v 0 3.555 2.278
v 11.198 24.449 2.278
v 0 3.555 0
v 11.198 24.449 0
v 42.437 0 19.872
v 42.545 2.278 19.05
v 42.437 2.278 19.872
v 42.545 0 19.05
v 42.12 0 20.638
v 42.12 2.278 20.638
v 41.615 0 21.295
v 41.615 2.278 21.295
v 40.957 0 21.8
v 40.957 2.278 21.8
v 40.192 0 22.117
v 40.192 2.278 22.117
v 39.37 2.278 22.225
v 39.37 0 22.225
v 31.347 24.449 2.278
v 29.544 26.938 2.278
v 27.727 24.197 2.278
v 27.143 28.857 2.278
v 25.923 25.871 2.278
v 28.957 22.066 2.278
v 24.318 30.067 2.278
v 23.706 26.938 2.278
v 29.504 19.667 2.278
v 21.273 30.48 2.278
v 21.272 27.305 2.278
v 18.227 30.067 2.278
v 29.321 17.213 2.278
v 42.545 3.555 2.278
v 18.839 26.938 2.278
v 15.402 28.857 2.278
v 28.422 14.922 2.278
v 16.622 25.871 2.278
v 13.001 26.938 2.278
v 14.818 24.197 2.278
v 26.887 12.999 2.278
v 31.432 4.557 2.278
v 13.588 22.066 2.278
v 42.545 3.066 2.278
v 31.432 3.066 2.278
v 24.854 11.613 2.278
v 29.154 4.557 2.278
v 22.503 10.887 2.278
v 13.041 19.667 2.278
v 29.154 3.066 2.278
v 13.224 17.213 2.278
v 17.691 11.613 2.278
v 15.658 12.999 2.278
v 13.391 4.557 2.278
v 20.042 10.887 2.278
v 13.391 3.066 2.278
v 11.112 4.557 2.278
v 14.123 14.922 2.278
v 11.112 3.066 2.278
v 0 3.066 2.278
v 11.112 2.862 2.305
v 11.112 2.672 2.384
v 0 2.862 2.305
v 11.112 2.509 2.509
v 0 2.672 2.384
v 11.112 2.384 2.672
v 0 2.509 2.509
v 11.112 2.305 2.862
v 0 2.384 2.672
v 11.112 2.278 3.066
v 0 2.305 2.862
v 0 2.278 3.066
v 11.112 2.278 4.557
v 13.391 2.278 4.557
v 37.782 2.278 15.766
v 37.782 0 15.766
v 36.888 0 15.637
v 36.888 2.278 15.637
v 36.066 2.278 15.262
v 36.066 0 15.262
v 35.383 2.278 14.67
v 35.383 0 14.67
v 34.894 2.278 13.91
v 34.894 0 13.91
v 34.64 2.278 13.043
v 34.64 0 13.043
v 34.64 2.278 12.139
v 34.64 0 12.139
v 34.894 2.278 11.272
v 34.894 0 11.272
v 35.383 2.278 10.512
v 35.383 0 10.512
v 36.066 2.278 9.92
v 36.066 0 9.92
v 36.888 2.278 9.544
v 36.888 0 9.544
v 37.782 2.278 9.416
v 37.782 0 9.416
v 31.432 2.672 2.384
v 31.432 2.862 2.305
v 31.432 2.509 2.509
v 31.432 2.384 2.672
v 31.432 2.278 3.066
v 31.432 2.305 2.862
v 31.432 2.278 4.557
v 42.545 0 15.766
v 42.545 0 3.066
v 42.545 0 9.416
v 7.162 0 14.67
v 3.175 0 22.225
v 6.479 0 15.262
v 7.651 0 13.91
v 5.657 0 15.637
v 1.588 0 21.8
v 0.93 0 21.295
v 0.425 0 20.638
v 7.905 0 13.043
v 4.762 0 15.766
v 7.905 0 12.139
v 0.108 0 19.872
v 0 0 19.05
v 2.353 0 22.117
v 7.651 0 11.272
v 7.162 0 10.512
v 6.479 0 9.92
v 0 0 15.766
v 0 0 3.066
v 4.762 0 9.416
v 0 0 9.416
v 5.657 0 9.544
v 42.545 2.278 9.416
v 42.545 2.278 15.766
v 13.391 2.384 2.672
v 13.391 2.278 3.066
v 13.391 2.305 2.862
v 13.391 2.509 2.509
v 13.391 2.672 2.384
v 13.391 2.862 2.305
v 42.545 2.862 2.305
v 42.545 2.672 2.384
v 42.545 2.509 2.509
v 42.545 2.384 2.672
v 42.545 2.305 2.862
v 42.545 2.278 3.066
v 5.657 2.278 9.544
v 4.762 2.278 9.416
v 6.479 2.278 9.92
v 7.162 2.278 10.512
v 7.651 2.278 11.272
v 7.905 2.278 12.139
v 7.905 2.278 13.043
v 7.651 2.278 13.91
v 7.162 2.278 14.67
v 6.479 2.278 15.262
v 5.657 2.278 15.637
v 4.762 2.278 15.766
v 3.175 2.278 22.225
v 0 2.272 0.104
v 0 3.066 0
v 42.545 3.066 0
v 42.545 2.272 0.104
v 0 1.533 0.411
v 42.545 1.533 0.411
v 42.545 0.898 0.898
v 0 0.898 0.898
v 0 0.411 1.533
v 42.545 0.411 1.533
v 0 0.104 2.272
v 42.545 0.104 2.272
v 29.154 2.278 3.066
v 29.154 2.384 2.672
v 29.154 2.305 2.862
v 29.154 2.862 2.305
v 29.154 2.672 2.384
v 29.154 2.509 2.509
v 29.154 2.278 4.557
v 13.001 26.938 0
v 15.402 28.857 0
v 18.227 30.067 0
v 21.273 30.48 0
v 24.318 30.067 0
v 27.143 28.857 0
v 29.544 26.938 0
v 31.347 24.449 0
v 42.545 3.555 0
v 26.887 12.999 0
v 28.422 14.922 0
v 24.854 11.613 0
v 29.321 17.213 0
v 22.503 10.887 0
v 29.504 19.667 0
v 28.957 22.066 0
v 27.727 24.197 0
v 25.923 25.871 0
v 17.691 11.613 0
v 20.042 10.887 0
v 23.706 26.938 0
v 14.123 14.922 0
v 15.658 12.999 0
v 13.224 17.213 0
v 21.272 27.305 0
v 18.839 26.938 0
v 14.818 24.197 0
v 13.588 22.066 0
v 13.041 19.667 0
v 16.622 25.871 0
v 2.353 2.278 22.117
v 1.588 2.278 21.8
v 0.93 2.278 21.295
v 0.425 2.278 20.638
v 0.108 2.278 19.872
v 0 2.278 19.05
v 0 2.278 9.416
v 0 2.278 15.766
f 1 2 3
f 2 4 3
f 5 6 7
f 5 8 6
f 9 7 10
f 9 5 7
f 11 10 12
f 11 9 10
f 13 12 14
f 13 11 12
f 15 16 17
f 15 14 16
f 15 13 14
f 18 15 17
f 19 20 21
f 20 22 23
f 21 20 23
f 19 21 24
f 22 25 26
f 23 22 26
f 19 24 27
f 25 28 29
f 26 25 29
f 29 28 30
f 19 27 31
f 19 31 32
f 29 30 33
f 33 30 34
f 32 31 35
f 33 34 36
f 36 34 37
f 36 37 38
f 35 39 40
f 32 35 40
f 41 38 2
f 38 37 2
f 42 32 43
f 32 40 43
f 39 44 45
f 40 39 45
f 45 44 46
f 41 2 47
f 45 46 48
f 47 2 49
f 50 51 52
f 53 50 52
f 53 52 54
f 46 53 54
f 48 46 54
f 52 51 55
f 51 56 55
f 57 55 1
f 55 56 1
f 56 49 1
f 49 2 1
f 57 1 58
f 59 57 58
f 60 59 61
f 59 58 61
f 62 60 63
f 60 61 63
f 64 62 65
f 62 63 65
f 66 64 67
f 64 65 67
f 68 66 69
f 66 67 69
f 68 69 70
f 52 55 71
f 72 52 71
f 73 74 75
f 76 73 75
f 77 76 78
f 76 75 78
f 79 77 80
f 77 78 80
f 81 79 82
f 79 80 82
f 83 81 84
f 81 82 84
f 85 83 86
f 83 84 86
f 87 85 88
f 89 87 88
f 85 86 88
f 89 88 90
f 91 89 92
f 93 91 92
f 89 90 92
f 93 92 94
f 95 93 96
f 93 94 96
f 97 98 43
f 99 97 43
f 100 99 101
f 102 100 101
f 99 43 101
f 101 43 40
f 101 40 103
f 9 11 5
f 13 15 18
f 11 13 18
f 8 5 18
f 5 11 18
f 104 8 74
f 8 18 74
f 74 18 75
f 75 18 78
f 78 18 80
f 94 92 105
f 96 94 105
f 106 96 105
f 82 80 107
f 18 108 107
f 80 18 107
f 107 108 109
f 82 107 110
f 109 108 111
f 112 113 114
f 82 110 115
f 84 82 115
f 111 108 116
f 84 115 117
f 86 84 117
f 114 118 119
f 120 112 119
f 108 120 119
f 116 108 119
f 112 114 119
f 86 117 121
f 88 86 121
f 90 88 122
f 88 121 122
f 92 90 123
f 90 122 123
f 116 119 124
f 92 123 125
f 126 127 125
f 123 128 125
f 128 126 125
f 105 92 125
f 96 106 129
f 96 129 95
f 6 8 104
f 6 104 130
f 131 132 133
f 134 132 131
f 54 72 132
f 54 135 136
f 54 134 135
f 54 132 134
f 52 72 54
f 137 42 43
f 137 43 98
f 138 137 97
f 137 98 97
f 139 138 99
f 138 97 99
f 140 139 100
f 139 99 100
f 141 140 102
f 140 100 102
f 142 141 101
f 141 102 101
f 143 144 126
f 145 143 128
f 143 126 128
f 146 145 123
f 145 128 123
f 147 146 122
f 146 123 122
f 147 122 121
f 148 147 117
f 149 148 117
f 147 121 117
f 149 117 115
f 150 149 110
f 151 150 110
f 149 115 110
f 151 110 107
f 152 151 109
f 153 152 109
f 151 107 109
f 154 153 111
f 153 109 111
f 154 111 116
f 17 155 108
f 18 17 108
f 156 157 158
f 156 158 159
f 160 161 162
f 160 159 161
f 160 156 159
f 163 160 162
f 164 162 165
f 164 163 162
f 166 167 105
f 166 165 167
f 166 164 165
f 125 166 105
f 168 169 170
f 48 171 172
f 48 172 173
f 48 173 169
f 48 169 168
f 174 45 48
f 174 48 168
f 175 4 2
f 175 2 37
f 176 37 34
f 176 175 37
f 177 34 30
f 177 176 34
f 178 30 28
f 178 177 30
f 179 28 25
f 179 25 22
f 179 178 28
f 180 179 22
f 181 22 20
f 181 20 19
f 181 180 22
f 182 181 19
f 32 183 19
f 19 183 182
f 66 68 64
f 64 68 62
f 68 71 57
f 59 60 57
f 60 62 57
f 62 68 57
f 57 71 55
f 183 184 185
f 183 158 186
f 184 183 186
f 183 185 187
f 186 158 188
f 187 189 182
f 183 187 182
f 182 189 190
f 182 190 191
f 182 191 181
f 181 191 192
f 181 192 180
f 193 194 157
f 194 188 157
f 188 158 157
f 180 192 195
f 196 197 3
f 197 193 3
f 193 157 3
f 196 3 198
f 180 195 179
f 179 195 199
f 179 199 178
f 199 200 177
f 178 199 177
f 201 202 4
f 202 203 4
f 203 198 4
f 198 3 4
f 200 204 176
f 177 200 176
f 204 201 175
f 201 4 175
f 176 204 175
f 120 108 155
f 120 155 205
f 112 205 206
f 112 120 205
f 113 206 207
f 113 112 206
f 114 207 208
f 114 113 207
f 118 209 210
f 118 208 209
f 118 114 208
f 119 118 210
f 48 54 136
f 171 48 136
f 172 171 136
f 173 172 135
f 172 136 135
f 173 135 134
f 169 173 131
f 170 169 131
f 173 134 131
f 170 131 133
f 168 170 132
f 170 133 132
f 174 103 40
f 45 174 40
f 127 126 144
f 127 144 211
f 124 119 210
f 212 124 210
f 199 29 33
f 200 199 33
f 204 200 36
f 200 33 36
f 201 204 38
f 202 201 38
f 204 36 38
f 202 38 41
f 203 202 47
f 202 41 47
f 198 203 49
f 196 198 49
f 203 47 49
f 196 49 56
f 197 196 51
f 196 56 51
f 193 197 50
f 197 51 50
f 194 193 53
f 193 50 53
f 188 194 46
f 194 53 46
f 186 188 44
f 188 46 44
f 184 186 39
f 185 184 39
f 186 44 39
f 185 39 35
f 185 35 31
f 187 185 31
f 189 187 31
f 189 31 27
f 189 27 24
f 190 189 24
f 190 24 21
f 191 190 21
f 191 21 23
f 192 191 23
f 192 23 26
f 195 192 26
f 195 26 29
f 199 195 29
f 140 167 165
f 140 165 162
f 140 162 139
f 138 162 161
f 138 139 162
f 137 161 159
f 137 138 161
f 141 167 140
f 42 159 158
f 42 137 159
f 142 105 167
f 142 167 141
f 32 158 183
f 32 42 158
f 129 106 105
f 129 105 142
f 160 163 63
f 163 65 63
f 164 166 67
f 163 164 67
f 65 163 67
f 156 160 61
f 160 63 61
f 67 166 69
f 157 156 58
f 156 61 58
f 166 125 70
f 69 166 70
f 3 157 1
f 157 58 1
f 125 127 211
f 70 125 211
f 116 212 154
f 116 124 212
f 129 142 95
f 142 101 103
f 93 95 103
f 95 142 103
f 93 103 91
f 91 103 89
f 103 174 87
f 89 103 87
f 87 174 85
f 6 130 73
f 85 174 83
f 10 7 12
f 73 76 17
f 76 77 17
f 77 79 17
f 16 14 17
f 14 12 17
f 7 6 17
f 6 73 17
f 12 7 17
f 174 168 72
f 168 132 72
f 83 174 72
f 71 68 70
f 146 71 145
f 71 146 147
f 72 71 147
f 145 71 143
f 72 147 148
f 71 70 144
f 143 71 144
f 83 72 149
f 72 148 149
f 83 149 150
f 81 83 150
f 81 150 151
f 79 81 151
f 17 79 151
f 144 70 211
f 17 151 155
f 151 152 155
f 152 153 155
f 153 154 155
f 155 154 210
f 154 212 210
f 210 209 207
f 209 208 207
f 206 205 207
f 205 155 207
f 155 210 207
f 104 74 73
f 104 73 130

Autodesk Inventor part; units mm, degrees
sketch "Sketch_1" plane through (0, 0, 0) normal (1, 0, 0) x (0, 1, 0)
  line L0 (0, 22.225) -> (0, 3.0658)
  arc A0 (0, 3.0658) -> (3.0658, 0) centre (3.0658, 3.0658) ccw
  line L1 (3.0658, 0) -> (31.6408, 0)
  line L2 (31.6408, 0) -> (31.6408, 2.2784)
  line L3 (31.6408, 2.2784) -> (3.0658, 2.2784)
  arc A1 (2.2784, 3.0658) -> (3.0658, 2.2784) centre (3.0658, 3.0658) ccw
  line L4 (2.2784, 3.0658) -> (2.2784, 22.225)
  line L5 (2.2784, 22.225) -> (0, 22.225)
  dimension "d36" = 28.575
  dimension "d37" = 3.0658
  dimension "d38" = 0.7874
  dimension "d40" = 2.2784
  dimension "d43" = 22.225
extrude "Extrusion1" add sketch "Sketch_1" along normal blind 42.545
sketch "Sketch_2" plane through (0, 0, 0) normal (0, 0, 1) x (1, 0, 0)
  line L0 (-3.175, -2.1057) -> (45.72, -2.1057)
  line L1 (45.72, -2.1057) -> (45.72, 33.6906)
  line L2 (45.72, 33.6906) -> (-3.175, 33.6906)
  line L3 (-3.175, 33.6906) -> (-3.175, -2.1057)
  line L4 (-1.905, 0) -> (44.45, 0)
  line L5 (44.45, 0) -> (31.3469, 24.4492)
  arc A0 (31.3469, 24.4492) -> (11.1981, 24.4492) centre (21.2725, 19.05) ccw
  line L6 (11.1981, 24.4492) -> (-1.905, 0)
  line L7 (0, 0) -> (0, 3.0658) construction
  line L8 (0, 3.0658) -> (42.545, 3.0658) construction
  line L9 (42.545, 0) -> (42.545, 3.0658) construction
  line L10 (0, 0) -> (42.545, 0) construction
  line L11 (21.2725, 19.05) -> (21.2725, 0) construction
  line L12 (21.2725, 0) -> (21.2725, -2.1057) construction
  dimension "d23" = 46.355
  dimension "d24" = 11.43
  dimension "d25" = 19.05
  dimension "d26" = 35.7962
  dimension "d27" = 48.895
  dimension "d30" = 2.1057
extrude "Extrusion2" cut sketch "Sketch_2" along normal blind 3.4176
sketch "Sketch3" plane through (42.545, 3.0658, 0) normal (0, 0, -1) x (-1, 0, 0)
  arc A0 (31.3469, 21.3834) -> (11.1981, 21.3834) centre (21.2725, 15.9842) ccw projected
hole "Drilling 1" at (21.2725, 19.05, 0) direction (0, 0, 1) diameter 16.51 depth 3.4176
sketch "Sketch_8" plane through (0, 0, 0) normal (0, 1, 0) x (-1, 0, 0)
  line L0 (3.4925, 15.7658) -> (-4.7625, 15.7658)
  arc A0 (-4.7625, 15.7658) -> (-4.7625, 9.4158) centre (-4.7625, 12.5908) ccw
  line L1 (-4.7625, 9.4158) -> (3.4925, 9.4158)
  line L2 (3.4925, 9.4158) -> (3.4925, 15.7658)
  line L3 (0, 3.0658) -> (-42.545, 3.0658) projected
  dimension "d31" = 3.4925
  dimension "d32" = 8.255
  dimension "d33" = 3.175
  dimension "d34" = 6.35
  dimension "d35" = 6.35
extrude "Extrusion5" cut sketch "Sketch_8" along normal blind 3.4176
sketch "Sketch_10" plane through (11.1125, 0, 0) normal (1, 0, 0) x (0, 0, -1)
  arc A0 (-4.5568, 1.8456) -> (-1.8456, 4.5568) centre (-3.0658, 3.0658) ccw
  line L0 (-1.8456, 4.5568) -> (-2.2784, 4.5568)
  line L1 (-2.2784, 4.5568) -> (-4.5568, 2.2784)
  line L2 (-4.5568, 2.2784) -> (-4.5568, 1.8456)
extrude "Extrusion7" add sketch "Sketch_10" along normal blind 2.2784
ref_plane "h1_XY" through (17.4625, 0, 17.526) normal (1, 0, 0) x (0, 0, -1)
ref_plane "h1_YZ" through (17.4625, 0, 17.526) normal (0, 0, -1) x (0, 1, 0)
ref_plane "h1_ZX" through (17.4625, 0, 17.526) normal (0, 1, 0) x (1, 0, 0)
ref_plane "d1_XY" through (17.4625, 8.6728, 0) normal (1, 0, 0) x (0, 0, -1)
ref_plane "d1_YZ" through (17.4625, 8.6728, 0) normal (0, 0, -1) x (0, 1, 0)
ref_plane "d1_ZX" through (17.4625, 8.6728, 0) normal (0, 1, 0) x (1, 0, 0)
ref_plane "h2_XY" through (17.4625, 2.2784, 17.526) normal (1, 0, 0) x (0, 0, -1)
ref_plane "h2_YZ" through (17.4625, 2.2784, 17.526) normal (0, 0, -1) x (0, 1, 0)
ref_plane "h2_ZX" through (17.4625, 2.2784, 17.526) normal (0, 1, 0) x (1, 0, 0)
ref_plane "d2_XY" through (17.4625, 19.8615, 0) normal (1, 0, 0) x (0, 0, -1)
ref_plane "d2_YZ" through (17.4625, 19.8615, 0) normal (0, 0, -1) x (0, 1, 0)
ref_plane "d2_ZX" through (17.4625, 19.8615, 0) normal (0, 1, 0) x (1, 0, 0)
ref_plane "h3_XY" through (17.4625, 14.2672, 2.2784) normal (1, 0, 0) x (0, 0, -1)
ref_plane "h3_YZ" through (17.4625, 14.2672, 2.2784) normal (0, 0, -1) x (0, 1, 0)
ref_plane "h3_ZX" through (17.4625, 14.2672, 2.2784) normal (0, 1, 0) x (1, 0, 0)
ref_plane "h4_XY" through (17.4625, 21.0566, 2.2784) normal (1, 0, 0) x (0, 0, -1)
ref_plane "h4_YZ" through (17.4625, 21.0566, 2.2784) normal (0, 0, -1) x (0, 1, 0)
ref_plane "h4_ZX" through (17.4625, 21.0566, 2.2784) normal (0, 1, 0) x (1, 0, 0)
ref_plane "h5_XY" through (34.925, 3.175, 0) normal (1, 0, 0) x (0, 0, -1)
ref_plane "h5_YZ" through (34.925, 3.175, 0) normal (0, 0, -1) x (0, 1, 0)
ref_plane "h5_ZX" through (34.925, 3.175, 0) normal (0, 1, 0) x (1, 0, 0)
ref_plane "h6_XY" through (34.925, 0, 0) normal (1, 0, 0) x (0, 0, -1)
ref_plane "h6_YZ" through (34.925, 0, 0) normal (0, 0, -1) x (0, 1, 0)
ref_plane "h6_ZX" through (34.925, 0, 0) normal (0, 1, 0) x (1, 0, 0)
ref_plane "l1_XY" through (0, 0, 0) normal (0, 1, 0) x (1, 0, 0)
ref_plane "l1_YZ" through (0, 0, 0) normal (1, 0, 0) x (0, 0, -1)
ref_plane "l1_ZX" through (0, 0, 0) normal (0, 0, -1) x (0, 1, 0)
ref_plane "l2_XY" through (34.925, 0, 0) normal (0, 1, 0) x (1, 0, 0)
ref_plane "l2_YZ" through (34.925, 0, 0) normal (1, 0, 0) x (0, 0, -1)
ref_plane "l2_ZX" through (34.925, 0, 0) normal (0, 0, -1) x (0, 1, 0)
ref_plane "l3_XY" through (0, 0, 17.526) normal (0, 1, 0) x (1, 0, 0)
ref_plane "l3_YZ" through (0, 0, 17.526) normal (1, 0, 0) x (0, 0, -1)
ref_plane "l3_ZX" through (0, 0, 17.526) normal (0, 0, -1) x (0, 1, 0)
ref_plane "l4_XY" through (0, 0, 9.652) normal (0, 1, 0) x (1, 0, 0)
ref_plane "l4_YZ" through (0, 0, 9.652) normal (1, 0, 0) x (0, 0, -1)
ref_plane "l4_ZX" through (0, 0, 9.652) normal (0, 0, -1) x (0, 1, 0)
ref_plane "l5_XY" through (4.7625, 0, 9.652) normal (0, 1, 0) x (1, 0, 0)
ref_plane "l5_YZ" through (4.7625, 0, 9.652) normal (1, 0, 0) x (0, 0, -1)
ref_plane "l5_ZX" through (4.7625, 0, 9.652) normal (0, 0, -1) x (0, 1, 0)
ref_plane "l6_XY" through (30.1625, 0, 9.652) normal (0, 1, 0) x (1, 0, 0)
ref_plane "l6_YZ" through (30.1625, 0, 9.652) normal (1, 0, 0) x (0, 0, -1)
ref_plane "l6_ZX" through (30.1625, 0, 9.652) normal (0, 0, -1) x (0, 1, 0)
ref_plane "l7_XY" through (30.1625, 0, 12.0904) normal (0, 1, 0) x (1, 0, 0)
ref_plane "l7_YZ" through (30.1625, 0, 12.0904) normal (1, 0, 0) x (0, 0, -1)
ref_plane "l7_ZX" through (30.1625, 0, 12.0904) normal (0, 0, -1) x (0, 1, 0)
ref_plane "l8_XY" through (30.1625, 0, 7.2136) normal (0, 1, 0) x (1, 0, 0)
ref_plane "l8_YZ" through (30.1625, 0, 7.2136) normal (1, 0, 0) x (0, 0, -1)
ref_plane "l8_ZX" through (30.1625, 0, 7.2136) normal (0, 0, -1) x (0, 1, 0)
ref_plane "mounting_bracket_XY" through (17.4625, 14.2672, 2.2784) normal (0, 0, 1) x (1, 0, 0)
ref_plane "mounting_bracket_YZ" through (17.4625, 14.2672, 2.2784) normal (1, 0, 0) x (0, 1, 0)
ref_plane "mounting_bracket_ZX" through (17.4625, 14.2672, 2.2784) normal (0, 1, 0) x (0, 0, 1)
ref_plane "mounting_bracket_1_XY" through (17.4625, 14.2672, 0) normal (0, 0, 1) x (1, 0, 0)
ref_plane "mounting_bracket_1_YZ" through (17.4625, 14.2672, 0) normal (1, 0, 0) x (0, 1, 0)
ref_plane "mounting_bracket_1_ZX" through (17.4625, 14.2672, 0) normal (0, 1, 0) x (0, 0, 1)
fillet "Fillet1" radius 3.175 1 edges at (0, 1.1392, 22.225)
ref_plane "Work Plane56" through (21.2725, 0, 0) normal (1, 0, 0) x (0, 0, -1)
mirror "Mirror2" about plane through (21.2725, 0, 0) normal (1, 0, 0) of "Extrusion5", "Fillet1", "Extrusion7"
equation "\"d33\" = 0.5 * d34"
properties part number "Rebuild Shooter NCDME075-0600 Cylinder Mounting Bracket" material "Steel"
